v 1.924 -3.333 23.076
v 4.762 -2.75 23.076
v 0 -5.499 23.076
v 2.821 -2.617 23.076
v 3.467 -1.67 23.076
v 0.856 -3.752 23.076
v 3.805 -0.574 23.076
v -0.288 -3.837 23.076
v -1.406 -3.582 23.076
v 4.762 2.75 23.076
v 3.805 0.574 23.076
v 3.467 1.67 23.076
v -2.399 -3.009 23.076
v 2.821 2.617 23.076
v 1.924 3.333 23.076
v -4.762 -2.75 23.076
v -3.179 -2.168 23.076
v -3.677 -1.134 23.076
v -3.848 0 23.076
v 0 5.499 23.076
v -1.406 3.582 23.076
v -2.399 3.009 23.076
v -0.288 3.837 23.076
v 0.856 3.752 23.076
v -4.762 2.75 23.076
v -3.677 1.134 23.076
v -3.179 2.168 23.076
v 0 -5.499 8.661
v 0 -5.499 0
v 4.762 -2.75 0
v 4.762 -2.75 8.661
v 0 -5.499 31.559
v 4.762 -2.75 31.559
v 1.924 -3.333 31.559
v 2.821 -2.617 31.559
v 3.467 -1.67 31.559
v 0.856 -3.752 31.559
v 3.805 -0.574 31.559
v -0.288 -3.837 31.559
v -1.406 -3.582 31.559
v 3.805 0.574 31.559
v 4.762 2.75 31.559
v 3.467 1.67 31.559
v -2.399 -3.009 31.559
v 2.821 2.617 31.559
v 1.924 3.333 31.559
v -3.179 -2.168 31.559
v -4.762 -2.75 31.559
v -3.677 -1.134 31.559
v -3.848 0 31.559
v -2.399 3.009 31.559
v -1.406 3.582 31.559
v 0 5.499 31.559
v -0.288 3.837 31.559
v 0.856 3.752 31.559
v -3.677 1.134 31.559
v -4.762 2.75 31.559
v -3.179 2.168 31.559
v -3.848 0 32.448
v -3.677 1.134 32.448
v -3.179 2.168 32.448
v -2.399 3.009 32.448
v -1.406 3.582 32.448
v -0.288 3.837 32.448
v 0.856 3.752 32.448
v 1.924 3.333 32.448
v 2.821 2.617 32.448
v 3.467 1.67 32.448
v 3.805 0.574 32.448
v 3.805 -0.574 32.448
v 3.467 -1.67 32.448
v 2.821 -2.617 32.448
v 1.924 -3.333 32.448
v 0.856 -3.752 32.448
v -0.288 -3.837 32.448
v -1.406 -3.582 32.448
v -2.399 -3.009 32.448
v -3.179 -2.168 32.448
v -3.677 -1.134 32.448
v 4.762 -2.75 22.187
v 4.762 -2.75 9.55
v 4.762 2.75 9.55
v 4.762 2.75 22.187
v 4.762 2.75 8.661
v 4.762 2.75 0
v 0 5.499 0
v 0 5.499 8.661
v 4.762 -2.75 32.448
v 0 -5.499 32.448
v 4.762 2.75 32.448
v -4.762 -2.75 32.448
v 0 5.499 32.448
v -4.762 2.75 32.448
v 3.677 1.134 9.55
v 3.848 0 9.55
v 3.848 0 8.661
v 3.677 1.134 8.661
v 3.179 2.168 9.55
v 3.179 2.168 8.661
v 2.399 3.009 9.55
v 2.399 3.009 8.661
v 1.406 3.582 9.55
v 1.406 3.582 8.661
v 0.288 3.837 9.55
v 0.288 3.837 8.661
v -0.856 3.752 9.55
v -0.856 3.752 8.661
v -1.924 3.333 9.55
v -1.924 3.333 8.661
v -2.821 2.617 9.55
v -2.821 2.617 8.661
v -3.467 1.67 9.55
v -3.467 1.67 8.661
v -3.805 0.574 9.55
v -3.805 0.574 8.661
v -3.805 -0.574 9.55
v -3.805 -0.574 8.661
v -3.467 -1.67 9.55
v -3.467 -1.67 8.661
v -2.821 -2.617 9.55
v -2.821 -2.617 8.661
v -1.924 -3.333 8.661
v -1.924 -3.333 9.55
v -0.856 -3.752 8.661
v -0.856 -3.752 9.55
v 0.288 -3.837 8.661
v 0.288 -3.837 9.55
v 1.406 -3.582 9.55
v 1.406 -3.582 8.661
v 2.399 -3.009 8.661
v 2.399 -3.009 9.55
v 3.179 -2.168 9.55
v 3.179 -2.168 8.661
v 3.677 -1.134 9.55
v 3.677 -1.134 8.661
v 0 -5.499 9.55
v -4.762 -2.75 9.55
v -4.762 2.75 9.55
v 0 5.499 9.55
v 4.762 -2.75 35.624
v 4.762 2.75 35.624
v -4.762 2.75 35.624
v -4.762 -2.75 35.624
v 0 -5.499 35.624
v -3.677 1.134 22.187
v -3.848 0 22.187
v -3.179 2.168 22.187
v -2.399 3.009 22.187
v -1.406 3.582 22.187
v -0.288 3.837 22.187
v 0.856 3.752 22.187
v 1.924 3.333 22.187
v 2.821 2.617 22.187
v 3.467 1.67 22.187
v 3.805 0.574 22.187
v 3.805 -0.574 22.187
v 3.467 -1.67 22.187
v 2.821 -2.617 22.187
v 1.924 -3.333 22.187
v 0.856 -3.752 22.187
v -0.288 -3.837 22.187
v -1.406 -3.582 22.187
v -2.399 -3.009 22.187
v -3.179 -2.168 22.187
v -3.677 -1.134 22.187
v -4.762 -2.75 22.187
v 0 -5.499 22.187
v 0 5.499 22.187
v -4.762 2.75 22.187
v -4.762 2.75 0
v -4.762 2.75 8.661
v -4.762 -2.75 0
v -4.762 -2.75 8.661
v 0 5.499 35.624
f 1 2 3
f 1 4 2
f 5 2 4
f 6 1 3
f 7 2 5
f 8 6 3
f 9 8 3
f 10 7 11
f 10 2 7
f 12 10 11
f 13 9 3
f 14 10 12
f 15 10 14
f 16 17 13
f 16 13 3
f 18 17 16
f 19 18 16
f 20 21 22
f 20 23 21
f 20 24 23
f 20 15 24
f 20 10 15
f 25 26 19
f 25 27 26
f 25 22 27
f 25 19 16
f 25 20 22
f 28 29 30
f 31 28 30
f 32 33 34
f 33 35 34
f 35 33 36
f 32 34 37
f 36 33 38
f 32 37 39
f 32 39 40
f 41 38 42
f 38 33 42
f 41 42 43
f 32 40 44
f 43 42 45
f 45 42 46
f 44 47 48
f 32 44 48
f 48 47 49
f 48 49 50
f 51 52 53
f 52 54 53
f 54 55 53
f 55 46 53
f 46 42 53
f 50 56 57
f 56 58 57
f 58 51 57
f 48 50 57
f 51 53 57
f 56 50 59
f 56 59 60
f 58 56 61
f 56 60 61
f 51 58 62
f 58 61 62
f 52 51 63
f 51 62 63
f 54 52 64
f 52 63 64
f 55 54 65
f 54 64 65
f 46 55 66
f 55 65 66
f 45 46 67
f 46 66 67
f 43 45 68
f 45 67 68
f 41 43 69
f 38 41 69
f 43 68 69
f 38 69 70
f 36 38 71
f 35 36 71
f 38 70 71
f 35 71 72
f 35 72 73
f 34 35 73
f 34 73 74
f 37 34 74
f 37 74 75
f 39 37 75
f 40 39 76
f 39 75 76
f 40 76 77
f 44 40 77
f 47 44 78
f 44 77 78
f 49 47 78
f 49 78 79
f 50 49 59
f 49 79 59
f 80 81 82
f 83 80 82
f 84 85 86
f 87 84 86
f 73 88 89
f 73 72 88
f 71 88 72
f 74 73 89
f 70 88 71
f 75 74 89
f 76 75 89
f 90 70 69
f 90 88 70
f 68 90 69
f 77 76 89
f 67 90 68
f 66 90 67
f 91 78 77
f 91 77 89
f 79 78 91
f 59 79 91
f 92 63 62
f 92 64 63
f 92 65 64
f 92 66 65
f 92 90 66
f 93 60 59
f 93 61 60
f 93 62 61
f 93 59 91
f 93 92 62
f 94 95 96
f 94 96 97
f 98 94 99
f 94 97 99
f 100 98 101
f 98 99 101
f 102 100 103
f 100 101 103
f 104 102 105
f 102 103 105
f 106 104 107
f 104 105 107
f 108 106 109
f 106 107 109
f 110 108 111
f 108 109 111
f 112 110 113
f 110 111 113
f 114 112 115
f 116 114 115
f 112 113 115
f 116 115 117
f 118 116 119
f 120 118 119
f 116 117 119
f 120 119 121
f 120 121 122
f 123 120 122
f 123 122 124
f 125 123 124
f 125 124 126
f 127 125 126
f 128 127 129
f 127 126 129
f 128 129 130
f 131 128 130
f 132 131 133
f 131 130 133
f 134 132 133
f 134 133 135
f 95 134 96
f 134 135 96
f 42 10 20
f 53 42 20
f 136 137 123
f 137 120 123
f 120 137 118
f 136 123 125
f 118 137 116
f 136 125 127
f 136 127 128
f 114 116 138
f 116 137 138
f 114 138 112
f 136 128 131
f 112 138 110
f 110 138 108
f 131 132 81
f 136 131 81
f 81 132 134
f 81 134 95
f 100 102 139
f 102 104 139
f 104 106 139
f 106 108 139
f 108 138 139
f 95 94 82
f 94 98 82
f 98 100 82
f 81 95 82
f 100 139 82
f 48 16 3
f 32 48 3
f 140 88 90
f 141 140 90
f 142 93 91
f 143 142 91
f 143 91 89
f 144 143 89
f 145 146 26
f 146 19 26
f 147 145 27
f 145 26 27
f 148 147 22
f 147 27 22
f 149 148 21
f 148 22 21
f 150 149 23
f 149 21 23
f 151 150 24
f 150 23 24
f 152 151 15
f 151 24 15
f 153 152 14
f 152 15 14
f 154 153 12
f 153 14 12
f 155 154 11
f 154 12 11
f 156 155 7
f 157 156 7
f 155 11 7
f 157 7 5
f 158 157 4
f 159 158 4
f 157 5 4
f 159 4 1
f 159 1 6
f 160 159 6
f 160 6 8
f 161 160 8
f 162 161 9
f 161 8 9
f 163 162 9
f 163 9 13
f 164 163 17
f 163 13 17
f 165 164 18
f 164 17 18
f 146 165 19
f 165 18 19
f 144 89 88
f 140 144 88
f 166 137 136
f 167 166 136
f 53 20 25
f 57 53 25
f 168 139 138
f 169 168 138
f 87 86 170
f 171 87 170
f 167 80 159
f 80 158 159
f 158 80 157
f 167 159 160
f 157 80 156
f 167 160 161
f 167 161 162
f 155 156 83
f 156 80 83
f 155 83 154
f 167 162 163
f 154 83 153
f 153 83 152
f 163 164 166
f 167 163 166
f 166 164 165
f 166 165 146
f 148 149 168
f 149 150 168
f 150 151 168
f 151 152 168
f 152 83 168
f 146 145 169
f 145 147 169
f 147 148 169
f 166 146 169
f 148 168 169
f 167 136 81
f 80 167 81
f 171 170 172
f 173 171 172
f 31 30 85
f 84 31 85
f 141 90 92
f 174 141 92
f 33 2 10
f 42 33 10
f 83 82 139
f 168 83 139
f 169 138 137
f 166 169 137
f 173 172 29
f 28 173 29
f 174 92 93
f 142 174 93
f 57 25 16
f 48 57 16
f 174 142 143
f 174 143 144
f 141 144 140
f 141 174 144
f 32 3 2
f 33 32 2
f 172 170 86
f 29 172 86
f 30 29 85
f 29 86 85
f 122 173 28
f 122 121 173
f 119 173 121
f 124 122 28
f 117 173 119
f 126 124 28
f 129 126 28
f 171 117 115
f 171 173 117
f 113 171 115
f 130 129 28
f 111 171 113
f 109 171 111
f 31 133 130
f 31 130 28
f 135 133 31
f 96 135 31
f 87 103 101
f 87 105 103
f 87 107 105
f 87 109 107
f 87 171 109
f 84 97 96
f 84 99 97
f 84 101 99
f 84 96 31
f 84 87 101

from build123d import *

# Parameters (mm, degrees)
BOSS_EXTRUDE1_DEPTH = 40.6146
SKETCH5_W           = 11.10345239
SKETCH5_H           = 12.145052052
SKETCH5_R           = 3.8481
CUT_EXTRUDE2_DEPTH  = 0.4445
SKETCH10_W          = 12.002544197
SKETCH10_H          = 11.794166694
SKETCH10_R          = 3.8481
CUT_EXTRUDE7_DEPTH  = 0.4445
SKETCH9_W           = 11.366817307
SKETCH9_H           = 11.947942936
SKETCH9_R           = 3.8481
CUT_EXTRUDE6_DEPTH  = 0.4445
SKETCH11_R          = 5.745102087
CUT_EXTRUDE8_DEPTH  = 4.9911


with BuildPart() as part:
    # Sketch1 → Boss-Extrude1 (new body)
    with BuildSketch(Plane.XY):
        Polygon((0, 5.499261314), (-4.7625, 2.749630657), (-4.7625, -2.749630657), (0, -5.499261314), (4.7625, -2.749630657), (4.7625, 2.749630657), align=None)
    extrude(amount=BOSS_EXTRUDE1_DEPTH)

    # Sketch5 → Cut-Extrude2 (cut, symmetric)
    with BuildSketch(Plane(origin=(0, 0, 22.6314), x_dir=(-1, 0, 0), z_dir=(0, 0, -1))):
        with Locations((-0.378227241, -0.09440181)):
            Rectangle(SKETCH5_W, SKETCH5_H)
        Circle(SKETCH5_R, mode=Mode.SUBTRACT)
    extrude(amount=CUT_EXTRUDE2_DEPTH, both=True, mode=Mode.SUBTRACT)

    # Sketch10 → Cut-Extrude7 (cut, symmetric)
    with BuildSketch(Plane(origin=(0, 0, 32.004), x_dir=(-1, 0, 0), z_dir=(0, 0, -1))):
        with Locations((-0.081621529, -0.253464989)):
            Rectangle(SKETCH10_W, SKETCH10_H)
        Circle(SKETCH10_R, mode=Mode.SUBTRACT)
    extrude(amount=CUT_EXTRUDE7_DEPTH, both=True, mode=Mode.SUBTRACT)

    # Sketch9 → Cut-Extrude6 (cut, symmetric)
    with BuildSketch(Plane.XY.offset(9.1059)):
        with Locations((0.130537015, 0.158516672)):
            Rectangle(SKETCH9_W, SKETCH9_H)
        Circle(SKETCH9_R, mode=Mode.SUBTRACT)
    extrude(amount=CUT_EXTRUDE6_DEPTH, both=True, mode=Mode.SUBTRACT)

    # Sketch11 → Cut-Extrude8 (cut)
    with BuildSketch(Plane.XY.offset(40.6146)):
        Circle(SKETCH11_R)
    extrude(amount=-CUT_EXTRUDE8_DEPTH, mode=Mode.SUBTRACT)


solid = part.part
